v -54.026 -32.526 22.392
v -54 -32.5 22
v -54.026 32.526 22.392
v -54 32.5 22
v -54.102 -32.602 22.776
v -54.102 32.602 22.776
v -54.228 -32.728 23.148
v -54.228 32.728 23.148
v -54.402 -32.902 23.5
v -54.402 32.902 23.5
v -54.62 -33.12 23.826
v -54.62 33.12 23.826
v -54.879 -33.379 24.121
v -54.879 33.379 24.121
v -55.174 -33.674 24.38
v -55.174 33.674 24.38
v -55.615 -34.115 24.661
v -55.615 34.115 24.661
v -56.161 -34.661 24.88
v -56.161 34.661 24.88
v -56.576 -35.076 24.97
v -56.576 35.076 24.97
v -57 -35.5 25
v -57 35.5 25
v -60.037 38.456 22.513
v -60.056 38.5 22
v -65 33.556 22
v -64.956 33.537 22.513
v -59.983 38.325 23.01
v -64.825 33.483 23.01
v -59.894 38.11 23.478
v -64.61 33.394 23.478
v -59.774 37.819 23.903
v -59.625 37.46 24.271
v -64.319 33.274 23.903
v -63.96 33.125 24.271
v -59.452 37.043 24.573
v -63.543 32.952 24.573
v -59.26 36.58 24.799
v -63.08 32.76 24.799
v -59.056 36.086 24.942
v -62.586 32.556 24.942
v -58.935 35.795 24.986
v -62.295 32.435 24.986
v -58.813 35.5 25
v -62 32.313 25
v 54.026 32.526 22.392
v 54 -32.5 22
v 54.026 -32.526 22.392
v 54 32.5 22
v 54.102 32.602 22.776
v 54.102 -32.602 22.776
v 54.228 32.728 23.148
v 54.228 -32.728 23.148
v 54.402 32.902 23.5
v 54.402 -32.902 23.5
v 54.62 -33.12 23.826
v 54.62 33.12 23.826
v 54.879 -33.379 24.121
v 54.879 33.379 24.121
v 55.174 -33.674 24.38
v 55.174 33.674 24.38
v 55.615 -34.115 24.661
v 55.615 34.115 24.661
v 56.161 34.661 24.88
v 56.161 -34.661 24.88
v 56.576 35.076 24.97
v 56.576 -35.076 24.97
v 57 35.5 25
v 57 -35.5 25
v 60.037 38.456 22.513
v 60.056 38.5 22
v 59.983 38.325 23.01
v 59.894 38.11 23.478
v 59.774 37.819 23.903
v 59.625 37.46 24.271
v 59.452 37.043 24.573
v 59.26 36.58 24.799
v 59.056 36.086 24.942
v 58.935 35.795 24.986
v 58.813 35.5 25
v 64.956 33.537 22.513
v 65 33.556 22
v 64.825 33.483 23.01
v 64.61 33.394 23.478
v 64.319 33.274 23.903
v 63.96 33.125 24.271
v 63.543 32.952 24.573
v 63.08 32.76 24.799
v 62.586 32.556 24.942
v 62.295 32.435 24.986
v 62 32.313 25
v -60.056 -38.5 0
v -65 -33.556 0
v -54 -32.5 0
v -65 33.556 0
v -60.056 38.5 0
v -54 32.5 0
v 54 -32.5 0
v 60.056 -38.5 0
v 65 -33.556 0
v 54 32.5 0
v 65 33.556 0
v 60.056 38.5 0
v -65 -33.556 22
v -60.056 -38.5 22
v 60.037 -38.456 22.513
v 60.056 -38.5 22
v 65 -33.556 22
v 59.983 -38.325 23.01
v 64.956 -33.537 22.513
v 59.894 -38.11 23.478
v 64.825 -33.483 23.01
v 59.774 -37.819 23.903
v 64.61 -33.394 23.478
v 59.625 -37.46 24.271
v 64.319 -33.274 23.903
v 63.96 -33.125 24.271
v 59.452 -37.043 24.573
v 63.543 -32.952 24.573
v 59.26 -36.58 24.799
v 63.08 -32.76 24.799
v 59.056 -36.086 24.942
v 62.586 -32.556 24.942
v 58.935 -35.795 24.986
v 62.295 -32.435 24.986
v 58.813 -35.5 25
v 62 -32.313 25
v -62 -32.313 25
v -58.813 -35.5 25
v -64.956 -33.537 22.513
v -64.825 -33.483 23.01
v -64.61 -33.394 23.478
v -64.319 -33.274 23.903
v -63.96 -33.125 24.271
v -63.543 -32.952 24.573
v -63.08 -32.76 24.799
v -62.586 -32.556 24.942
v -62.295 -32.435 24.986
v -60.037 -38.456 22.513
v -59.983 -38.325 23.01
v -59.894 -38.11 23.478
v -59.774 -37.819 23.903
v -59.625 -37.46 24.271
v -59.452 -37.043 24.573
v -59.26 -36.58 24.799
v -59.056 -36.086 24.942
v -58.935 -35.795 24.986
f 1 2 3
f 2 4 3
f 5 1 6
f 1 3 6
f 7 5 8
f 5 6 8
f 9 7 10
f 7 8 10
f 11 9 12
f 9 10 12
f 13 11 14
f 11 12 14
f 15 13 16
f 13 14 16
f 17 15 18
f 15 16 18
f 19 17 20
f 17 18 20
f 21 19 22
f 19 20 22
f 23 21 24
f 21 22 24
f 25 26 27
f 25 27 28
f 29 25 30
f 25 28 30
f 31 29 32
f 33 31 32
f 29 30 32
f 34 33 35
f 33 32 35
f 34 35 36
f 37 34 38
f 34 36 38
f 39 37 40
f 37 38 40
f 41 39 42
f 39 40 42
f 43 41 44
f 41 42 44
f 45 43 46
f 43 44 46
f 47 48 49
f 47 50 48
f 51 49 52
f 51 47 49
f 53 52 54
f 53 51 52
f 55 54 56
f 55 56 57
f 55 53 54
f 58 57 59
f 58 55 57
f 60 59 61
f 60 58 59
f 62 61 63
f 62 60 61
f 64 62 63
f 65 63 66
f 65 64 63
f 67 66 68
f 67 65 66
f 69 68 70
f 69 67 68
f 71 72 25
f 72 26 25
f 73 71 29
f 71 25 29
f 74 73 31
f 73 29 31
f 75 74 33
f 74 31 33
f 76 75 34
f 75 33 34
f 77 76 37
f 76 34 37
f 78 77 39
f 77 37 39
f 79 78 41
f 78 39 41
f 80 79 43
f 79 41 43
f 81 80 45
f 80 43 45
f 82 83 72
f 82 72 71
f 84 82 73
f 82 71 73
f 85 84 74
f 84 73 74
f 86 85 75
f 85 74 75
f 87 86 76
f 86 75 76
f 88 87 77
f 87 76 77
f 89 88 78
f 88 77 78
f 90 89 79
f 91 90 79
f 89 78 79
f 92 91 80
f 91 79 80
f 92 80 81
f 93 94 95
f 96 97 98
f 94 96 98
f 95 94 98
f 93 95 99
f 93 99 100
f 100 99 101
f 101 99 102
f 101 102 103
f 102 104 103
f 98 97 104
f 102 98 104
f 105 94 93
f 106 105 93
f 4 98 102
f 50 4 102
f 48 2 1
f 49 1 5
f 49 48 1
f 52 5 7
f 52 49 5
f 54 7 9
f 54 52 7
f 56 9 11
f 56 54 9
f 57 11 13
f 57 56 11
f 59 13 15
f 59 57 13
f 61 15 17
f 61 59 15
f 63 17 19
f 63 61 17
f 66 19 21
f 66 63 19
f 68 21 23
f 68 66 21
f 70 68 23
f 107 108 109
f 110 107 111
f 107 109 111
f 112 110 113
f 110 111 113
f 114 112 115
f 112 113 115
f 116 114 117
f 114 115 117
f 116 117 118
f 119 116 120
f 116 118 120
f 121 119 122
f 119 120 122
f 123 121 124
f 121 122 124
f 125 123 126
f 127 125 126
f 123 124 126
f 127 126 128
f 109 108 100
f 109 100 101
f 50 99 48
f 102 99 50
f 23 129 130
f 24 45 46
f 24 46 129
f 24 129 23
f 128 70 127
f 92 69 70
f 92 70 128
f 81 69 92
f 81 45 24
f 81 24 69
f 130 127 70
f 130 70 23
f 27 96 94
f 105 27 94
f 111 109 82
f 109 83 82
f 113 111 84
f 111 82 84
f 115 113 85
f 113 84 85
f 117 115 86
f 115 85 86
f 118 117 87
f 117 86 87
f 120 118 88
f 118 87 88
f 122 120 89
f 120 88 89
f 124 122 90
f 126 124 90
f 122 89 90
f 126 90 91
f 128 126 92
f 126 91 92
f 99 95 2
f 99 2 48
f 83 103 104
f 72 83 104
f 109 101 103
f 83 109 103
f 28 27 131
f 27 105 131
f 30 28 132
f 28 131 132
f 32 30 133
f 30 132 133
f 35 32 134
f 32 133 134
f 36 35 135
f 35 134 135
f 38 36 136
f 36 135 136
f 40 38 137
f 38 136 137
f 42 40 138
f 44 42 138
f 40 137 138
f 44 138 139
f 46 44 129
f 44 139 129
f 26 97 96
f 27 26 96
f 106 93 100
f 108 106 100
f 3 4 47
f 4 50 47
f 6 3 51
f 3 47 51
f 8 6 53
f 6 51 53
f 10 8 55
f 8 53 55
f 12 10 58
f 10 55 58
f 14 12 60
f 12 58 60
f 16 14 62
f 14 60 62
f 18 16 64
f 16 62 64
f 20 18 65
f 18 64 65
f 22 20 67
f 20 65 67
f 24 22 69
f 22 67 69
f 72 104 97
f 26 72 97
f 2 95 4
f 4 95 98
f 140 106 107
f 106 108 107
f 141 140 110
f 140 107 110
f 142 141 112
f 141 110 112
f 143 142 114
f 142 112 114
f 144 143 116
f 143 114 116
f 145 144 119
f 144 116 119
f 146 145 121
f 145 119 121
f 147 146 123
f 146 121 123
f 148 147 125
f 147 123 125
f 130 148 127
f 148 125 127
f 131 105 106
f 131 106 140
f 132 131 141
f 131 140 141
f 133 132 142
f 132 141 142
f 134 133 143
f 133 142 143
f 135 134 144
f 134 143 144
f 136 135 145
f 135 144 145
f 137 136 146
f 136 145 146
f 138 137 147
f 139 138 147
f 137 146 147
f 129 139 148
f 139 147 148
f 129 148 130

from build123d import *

# Parameters (mm, degrees)
F0_W     = 108
F0_H     = 65
F1_DEPTH = 25
F2_R     = 2.99999


# Not quite as in the source:
# - a fillet or chamfer is up to 0.001 mm smaller than in the source, because OpenCascade refuses the exact size


with BuildPart() as f1:
    # F0 (on Top) → F1 (new body)
    with BuildSketch(Plane.XY):
        Polygon((60.0555262864, 38.5), (-60.0555262864, 38.5), (-65, 33.5555262864), (-65, -33.5555262864), (-60.0555262864, -38.5), (60.0555262864, -38.5), (65, -33.5555262864), (65, 33.5555262864), align=None)
        Rectangle(F0_W, F0_H, mode=Mode.SUBTRACT)
    extrude(amount=F1_DEPTH)

    # F2 (radius 3 in the source; OpenCascade refuses exactly that, so slightly less here)
    f2_edges = [f1.edges().sort_by_distance(p)[0] for p in [
        (65, 0, 25),
        (62.527763, 36.027763, 25),
        (0, 38.5, 25),
        (-62.527763, 36.027763, 25),
        (-65, 0, 25),
        (-62.527763, -36.027763, 25),
        (0, -38.5, 25),
        (62.527763, -36.027763, 25),
        (-54, 0, 25),
        (0, 32.5, 25),
        (54, 0, 25),
        (0, -32.5, 25),
    ]]
    fillet(f2_edges, radius=F2_R)


solid = f1.part
